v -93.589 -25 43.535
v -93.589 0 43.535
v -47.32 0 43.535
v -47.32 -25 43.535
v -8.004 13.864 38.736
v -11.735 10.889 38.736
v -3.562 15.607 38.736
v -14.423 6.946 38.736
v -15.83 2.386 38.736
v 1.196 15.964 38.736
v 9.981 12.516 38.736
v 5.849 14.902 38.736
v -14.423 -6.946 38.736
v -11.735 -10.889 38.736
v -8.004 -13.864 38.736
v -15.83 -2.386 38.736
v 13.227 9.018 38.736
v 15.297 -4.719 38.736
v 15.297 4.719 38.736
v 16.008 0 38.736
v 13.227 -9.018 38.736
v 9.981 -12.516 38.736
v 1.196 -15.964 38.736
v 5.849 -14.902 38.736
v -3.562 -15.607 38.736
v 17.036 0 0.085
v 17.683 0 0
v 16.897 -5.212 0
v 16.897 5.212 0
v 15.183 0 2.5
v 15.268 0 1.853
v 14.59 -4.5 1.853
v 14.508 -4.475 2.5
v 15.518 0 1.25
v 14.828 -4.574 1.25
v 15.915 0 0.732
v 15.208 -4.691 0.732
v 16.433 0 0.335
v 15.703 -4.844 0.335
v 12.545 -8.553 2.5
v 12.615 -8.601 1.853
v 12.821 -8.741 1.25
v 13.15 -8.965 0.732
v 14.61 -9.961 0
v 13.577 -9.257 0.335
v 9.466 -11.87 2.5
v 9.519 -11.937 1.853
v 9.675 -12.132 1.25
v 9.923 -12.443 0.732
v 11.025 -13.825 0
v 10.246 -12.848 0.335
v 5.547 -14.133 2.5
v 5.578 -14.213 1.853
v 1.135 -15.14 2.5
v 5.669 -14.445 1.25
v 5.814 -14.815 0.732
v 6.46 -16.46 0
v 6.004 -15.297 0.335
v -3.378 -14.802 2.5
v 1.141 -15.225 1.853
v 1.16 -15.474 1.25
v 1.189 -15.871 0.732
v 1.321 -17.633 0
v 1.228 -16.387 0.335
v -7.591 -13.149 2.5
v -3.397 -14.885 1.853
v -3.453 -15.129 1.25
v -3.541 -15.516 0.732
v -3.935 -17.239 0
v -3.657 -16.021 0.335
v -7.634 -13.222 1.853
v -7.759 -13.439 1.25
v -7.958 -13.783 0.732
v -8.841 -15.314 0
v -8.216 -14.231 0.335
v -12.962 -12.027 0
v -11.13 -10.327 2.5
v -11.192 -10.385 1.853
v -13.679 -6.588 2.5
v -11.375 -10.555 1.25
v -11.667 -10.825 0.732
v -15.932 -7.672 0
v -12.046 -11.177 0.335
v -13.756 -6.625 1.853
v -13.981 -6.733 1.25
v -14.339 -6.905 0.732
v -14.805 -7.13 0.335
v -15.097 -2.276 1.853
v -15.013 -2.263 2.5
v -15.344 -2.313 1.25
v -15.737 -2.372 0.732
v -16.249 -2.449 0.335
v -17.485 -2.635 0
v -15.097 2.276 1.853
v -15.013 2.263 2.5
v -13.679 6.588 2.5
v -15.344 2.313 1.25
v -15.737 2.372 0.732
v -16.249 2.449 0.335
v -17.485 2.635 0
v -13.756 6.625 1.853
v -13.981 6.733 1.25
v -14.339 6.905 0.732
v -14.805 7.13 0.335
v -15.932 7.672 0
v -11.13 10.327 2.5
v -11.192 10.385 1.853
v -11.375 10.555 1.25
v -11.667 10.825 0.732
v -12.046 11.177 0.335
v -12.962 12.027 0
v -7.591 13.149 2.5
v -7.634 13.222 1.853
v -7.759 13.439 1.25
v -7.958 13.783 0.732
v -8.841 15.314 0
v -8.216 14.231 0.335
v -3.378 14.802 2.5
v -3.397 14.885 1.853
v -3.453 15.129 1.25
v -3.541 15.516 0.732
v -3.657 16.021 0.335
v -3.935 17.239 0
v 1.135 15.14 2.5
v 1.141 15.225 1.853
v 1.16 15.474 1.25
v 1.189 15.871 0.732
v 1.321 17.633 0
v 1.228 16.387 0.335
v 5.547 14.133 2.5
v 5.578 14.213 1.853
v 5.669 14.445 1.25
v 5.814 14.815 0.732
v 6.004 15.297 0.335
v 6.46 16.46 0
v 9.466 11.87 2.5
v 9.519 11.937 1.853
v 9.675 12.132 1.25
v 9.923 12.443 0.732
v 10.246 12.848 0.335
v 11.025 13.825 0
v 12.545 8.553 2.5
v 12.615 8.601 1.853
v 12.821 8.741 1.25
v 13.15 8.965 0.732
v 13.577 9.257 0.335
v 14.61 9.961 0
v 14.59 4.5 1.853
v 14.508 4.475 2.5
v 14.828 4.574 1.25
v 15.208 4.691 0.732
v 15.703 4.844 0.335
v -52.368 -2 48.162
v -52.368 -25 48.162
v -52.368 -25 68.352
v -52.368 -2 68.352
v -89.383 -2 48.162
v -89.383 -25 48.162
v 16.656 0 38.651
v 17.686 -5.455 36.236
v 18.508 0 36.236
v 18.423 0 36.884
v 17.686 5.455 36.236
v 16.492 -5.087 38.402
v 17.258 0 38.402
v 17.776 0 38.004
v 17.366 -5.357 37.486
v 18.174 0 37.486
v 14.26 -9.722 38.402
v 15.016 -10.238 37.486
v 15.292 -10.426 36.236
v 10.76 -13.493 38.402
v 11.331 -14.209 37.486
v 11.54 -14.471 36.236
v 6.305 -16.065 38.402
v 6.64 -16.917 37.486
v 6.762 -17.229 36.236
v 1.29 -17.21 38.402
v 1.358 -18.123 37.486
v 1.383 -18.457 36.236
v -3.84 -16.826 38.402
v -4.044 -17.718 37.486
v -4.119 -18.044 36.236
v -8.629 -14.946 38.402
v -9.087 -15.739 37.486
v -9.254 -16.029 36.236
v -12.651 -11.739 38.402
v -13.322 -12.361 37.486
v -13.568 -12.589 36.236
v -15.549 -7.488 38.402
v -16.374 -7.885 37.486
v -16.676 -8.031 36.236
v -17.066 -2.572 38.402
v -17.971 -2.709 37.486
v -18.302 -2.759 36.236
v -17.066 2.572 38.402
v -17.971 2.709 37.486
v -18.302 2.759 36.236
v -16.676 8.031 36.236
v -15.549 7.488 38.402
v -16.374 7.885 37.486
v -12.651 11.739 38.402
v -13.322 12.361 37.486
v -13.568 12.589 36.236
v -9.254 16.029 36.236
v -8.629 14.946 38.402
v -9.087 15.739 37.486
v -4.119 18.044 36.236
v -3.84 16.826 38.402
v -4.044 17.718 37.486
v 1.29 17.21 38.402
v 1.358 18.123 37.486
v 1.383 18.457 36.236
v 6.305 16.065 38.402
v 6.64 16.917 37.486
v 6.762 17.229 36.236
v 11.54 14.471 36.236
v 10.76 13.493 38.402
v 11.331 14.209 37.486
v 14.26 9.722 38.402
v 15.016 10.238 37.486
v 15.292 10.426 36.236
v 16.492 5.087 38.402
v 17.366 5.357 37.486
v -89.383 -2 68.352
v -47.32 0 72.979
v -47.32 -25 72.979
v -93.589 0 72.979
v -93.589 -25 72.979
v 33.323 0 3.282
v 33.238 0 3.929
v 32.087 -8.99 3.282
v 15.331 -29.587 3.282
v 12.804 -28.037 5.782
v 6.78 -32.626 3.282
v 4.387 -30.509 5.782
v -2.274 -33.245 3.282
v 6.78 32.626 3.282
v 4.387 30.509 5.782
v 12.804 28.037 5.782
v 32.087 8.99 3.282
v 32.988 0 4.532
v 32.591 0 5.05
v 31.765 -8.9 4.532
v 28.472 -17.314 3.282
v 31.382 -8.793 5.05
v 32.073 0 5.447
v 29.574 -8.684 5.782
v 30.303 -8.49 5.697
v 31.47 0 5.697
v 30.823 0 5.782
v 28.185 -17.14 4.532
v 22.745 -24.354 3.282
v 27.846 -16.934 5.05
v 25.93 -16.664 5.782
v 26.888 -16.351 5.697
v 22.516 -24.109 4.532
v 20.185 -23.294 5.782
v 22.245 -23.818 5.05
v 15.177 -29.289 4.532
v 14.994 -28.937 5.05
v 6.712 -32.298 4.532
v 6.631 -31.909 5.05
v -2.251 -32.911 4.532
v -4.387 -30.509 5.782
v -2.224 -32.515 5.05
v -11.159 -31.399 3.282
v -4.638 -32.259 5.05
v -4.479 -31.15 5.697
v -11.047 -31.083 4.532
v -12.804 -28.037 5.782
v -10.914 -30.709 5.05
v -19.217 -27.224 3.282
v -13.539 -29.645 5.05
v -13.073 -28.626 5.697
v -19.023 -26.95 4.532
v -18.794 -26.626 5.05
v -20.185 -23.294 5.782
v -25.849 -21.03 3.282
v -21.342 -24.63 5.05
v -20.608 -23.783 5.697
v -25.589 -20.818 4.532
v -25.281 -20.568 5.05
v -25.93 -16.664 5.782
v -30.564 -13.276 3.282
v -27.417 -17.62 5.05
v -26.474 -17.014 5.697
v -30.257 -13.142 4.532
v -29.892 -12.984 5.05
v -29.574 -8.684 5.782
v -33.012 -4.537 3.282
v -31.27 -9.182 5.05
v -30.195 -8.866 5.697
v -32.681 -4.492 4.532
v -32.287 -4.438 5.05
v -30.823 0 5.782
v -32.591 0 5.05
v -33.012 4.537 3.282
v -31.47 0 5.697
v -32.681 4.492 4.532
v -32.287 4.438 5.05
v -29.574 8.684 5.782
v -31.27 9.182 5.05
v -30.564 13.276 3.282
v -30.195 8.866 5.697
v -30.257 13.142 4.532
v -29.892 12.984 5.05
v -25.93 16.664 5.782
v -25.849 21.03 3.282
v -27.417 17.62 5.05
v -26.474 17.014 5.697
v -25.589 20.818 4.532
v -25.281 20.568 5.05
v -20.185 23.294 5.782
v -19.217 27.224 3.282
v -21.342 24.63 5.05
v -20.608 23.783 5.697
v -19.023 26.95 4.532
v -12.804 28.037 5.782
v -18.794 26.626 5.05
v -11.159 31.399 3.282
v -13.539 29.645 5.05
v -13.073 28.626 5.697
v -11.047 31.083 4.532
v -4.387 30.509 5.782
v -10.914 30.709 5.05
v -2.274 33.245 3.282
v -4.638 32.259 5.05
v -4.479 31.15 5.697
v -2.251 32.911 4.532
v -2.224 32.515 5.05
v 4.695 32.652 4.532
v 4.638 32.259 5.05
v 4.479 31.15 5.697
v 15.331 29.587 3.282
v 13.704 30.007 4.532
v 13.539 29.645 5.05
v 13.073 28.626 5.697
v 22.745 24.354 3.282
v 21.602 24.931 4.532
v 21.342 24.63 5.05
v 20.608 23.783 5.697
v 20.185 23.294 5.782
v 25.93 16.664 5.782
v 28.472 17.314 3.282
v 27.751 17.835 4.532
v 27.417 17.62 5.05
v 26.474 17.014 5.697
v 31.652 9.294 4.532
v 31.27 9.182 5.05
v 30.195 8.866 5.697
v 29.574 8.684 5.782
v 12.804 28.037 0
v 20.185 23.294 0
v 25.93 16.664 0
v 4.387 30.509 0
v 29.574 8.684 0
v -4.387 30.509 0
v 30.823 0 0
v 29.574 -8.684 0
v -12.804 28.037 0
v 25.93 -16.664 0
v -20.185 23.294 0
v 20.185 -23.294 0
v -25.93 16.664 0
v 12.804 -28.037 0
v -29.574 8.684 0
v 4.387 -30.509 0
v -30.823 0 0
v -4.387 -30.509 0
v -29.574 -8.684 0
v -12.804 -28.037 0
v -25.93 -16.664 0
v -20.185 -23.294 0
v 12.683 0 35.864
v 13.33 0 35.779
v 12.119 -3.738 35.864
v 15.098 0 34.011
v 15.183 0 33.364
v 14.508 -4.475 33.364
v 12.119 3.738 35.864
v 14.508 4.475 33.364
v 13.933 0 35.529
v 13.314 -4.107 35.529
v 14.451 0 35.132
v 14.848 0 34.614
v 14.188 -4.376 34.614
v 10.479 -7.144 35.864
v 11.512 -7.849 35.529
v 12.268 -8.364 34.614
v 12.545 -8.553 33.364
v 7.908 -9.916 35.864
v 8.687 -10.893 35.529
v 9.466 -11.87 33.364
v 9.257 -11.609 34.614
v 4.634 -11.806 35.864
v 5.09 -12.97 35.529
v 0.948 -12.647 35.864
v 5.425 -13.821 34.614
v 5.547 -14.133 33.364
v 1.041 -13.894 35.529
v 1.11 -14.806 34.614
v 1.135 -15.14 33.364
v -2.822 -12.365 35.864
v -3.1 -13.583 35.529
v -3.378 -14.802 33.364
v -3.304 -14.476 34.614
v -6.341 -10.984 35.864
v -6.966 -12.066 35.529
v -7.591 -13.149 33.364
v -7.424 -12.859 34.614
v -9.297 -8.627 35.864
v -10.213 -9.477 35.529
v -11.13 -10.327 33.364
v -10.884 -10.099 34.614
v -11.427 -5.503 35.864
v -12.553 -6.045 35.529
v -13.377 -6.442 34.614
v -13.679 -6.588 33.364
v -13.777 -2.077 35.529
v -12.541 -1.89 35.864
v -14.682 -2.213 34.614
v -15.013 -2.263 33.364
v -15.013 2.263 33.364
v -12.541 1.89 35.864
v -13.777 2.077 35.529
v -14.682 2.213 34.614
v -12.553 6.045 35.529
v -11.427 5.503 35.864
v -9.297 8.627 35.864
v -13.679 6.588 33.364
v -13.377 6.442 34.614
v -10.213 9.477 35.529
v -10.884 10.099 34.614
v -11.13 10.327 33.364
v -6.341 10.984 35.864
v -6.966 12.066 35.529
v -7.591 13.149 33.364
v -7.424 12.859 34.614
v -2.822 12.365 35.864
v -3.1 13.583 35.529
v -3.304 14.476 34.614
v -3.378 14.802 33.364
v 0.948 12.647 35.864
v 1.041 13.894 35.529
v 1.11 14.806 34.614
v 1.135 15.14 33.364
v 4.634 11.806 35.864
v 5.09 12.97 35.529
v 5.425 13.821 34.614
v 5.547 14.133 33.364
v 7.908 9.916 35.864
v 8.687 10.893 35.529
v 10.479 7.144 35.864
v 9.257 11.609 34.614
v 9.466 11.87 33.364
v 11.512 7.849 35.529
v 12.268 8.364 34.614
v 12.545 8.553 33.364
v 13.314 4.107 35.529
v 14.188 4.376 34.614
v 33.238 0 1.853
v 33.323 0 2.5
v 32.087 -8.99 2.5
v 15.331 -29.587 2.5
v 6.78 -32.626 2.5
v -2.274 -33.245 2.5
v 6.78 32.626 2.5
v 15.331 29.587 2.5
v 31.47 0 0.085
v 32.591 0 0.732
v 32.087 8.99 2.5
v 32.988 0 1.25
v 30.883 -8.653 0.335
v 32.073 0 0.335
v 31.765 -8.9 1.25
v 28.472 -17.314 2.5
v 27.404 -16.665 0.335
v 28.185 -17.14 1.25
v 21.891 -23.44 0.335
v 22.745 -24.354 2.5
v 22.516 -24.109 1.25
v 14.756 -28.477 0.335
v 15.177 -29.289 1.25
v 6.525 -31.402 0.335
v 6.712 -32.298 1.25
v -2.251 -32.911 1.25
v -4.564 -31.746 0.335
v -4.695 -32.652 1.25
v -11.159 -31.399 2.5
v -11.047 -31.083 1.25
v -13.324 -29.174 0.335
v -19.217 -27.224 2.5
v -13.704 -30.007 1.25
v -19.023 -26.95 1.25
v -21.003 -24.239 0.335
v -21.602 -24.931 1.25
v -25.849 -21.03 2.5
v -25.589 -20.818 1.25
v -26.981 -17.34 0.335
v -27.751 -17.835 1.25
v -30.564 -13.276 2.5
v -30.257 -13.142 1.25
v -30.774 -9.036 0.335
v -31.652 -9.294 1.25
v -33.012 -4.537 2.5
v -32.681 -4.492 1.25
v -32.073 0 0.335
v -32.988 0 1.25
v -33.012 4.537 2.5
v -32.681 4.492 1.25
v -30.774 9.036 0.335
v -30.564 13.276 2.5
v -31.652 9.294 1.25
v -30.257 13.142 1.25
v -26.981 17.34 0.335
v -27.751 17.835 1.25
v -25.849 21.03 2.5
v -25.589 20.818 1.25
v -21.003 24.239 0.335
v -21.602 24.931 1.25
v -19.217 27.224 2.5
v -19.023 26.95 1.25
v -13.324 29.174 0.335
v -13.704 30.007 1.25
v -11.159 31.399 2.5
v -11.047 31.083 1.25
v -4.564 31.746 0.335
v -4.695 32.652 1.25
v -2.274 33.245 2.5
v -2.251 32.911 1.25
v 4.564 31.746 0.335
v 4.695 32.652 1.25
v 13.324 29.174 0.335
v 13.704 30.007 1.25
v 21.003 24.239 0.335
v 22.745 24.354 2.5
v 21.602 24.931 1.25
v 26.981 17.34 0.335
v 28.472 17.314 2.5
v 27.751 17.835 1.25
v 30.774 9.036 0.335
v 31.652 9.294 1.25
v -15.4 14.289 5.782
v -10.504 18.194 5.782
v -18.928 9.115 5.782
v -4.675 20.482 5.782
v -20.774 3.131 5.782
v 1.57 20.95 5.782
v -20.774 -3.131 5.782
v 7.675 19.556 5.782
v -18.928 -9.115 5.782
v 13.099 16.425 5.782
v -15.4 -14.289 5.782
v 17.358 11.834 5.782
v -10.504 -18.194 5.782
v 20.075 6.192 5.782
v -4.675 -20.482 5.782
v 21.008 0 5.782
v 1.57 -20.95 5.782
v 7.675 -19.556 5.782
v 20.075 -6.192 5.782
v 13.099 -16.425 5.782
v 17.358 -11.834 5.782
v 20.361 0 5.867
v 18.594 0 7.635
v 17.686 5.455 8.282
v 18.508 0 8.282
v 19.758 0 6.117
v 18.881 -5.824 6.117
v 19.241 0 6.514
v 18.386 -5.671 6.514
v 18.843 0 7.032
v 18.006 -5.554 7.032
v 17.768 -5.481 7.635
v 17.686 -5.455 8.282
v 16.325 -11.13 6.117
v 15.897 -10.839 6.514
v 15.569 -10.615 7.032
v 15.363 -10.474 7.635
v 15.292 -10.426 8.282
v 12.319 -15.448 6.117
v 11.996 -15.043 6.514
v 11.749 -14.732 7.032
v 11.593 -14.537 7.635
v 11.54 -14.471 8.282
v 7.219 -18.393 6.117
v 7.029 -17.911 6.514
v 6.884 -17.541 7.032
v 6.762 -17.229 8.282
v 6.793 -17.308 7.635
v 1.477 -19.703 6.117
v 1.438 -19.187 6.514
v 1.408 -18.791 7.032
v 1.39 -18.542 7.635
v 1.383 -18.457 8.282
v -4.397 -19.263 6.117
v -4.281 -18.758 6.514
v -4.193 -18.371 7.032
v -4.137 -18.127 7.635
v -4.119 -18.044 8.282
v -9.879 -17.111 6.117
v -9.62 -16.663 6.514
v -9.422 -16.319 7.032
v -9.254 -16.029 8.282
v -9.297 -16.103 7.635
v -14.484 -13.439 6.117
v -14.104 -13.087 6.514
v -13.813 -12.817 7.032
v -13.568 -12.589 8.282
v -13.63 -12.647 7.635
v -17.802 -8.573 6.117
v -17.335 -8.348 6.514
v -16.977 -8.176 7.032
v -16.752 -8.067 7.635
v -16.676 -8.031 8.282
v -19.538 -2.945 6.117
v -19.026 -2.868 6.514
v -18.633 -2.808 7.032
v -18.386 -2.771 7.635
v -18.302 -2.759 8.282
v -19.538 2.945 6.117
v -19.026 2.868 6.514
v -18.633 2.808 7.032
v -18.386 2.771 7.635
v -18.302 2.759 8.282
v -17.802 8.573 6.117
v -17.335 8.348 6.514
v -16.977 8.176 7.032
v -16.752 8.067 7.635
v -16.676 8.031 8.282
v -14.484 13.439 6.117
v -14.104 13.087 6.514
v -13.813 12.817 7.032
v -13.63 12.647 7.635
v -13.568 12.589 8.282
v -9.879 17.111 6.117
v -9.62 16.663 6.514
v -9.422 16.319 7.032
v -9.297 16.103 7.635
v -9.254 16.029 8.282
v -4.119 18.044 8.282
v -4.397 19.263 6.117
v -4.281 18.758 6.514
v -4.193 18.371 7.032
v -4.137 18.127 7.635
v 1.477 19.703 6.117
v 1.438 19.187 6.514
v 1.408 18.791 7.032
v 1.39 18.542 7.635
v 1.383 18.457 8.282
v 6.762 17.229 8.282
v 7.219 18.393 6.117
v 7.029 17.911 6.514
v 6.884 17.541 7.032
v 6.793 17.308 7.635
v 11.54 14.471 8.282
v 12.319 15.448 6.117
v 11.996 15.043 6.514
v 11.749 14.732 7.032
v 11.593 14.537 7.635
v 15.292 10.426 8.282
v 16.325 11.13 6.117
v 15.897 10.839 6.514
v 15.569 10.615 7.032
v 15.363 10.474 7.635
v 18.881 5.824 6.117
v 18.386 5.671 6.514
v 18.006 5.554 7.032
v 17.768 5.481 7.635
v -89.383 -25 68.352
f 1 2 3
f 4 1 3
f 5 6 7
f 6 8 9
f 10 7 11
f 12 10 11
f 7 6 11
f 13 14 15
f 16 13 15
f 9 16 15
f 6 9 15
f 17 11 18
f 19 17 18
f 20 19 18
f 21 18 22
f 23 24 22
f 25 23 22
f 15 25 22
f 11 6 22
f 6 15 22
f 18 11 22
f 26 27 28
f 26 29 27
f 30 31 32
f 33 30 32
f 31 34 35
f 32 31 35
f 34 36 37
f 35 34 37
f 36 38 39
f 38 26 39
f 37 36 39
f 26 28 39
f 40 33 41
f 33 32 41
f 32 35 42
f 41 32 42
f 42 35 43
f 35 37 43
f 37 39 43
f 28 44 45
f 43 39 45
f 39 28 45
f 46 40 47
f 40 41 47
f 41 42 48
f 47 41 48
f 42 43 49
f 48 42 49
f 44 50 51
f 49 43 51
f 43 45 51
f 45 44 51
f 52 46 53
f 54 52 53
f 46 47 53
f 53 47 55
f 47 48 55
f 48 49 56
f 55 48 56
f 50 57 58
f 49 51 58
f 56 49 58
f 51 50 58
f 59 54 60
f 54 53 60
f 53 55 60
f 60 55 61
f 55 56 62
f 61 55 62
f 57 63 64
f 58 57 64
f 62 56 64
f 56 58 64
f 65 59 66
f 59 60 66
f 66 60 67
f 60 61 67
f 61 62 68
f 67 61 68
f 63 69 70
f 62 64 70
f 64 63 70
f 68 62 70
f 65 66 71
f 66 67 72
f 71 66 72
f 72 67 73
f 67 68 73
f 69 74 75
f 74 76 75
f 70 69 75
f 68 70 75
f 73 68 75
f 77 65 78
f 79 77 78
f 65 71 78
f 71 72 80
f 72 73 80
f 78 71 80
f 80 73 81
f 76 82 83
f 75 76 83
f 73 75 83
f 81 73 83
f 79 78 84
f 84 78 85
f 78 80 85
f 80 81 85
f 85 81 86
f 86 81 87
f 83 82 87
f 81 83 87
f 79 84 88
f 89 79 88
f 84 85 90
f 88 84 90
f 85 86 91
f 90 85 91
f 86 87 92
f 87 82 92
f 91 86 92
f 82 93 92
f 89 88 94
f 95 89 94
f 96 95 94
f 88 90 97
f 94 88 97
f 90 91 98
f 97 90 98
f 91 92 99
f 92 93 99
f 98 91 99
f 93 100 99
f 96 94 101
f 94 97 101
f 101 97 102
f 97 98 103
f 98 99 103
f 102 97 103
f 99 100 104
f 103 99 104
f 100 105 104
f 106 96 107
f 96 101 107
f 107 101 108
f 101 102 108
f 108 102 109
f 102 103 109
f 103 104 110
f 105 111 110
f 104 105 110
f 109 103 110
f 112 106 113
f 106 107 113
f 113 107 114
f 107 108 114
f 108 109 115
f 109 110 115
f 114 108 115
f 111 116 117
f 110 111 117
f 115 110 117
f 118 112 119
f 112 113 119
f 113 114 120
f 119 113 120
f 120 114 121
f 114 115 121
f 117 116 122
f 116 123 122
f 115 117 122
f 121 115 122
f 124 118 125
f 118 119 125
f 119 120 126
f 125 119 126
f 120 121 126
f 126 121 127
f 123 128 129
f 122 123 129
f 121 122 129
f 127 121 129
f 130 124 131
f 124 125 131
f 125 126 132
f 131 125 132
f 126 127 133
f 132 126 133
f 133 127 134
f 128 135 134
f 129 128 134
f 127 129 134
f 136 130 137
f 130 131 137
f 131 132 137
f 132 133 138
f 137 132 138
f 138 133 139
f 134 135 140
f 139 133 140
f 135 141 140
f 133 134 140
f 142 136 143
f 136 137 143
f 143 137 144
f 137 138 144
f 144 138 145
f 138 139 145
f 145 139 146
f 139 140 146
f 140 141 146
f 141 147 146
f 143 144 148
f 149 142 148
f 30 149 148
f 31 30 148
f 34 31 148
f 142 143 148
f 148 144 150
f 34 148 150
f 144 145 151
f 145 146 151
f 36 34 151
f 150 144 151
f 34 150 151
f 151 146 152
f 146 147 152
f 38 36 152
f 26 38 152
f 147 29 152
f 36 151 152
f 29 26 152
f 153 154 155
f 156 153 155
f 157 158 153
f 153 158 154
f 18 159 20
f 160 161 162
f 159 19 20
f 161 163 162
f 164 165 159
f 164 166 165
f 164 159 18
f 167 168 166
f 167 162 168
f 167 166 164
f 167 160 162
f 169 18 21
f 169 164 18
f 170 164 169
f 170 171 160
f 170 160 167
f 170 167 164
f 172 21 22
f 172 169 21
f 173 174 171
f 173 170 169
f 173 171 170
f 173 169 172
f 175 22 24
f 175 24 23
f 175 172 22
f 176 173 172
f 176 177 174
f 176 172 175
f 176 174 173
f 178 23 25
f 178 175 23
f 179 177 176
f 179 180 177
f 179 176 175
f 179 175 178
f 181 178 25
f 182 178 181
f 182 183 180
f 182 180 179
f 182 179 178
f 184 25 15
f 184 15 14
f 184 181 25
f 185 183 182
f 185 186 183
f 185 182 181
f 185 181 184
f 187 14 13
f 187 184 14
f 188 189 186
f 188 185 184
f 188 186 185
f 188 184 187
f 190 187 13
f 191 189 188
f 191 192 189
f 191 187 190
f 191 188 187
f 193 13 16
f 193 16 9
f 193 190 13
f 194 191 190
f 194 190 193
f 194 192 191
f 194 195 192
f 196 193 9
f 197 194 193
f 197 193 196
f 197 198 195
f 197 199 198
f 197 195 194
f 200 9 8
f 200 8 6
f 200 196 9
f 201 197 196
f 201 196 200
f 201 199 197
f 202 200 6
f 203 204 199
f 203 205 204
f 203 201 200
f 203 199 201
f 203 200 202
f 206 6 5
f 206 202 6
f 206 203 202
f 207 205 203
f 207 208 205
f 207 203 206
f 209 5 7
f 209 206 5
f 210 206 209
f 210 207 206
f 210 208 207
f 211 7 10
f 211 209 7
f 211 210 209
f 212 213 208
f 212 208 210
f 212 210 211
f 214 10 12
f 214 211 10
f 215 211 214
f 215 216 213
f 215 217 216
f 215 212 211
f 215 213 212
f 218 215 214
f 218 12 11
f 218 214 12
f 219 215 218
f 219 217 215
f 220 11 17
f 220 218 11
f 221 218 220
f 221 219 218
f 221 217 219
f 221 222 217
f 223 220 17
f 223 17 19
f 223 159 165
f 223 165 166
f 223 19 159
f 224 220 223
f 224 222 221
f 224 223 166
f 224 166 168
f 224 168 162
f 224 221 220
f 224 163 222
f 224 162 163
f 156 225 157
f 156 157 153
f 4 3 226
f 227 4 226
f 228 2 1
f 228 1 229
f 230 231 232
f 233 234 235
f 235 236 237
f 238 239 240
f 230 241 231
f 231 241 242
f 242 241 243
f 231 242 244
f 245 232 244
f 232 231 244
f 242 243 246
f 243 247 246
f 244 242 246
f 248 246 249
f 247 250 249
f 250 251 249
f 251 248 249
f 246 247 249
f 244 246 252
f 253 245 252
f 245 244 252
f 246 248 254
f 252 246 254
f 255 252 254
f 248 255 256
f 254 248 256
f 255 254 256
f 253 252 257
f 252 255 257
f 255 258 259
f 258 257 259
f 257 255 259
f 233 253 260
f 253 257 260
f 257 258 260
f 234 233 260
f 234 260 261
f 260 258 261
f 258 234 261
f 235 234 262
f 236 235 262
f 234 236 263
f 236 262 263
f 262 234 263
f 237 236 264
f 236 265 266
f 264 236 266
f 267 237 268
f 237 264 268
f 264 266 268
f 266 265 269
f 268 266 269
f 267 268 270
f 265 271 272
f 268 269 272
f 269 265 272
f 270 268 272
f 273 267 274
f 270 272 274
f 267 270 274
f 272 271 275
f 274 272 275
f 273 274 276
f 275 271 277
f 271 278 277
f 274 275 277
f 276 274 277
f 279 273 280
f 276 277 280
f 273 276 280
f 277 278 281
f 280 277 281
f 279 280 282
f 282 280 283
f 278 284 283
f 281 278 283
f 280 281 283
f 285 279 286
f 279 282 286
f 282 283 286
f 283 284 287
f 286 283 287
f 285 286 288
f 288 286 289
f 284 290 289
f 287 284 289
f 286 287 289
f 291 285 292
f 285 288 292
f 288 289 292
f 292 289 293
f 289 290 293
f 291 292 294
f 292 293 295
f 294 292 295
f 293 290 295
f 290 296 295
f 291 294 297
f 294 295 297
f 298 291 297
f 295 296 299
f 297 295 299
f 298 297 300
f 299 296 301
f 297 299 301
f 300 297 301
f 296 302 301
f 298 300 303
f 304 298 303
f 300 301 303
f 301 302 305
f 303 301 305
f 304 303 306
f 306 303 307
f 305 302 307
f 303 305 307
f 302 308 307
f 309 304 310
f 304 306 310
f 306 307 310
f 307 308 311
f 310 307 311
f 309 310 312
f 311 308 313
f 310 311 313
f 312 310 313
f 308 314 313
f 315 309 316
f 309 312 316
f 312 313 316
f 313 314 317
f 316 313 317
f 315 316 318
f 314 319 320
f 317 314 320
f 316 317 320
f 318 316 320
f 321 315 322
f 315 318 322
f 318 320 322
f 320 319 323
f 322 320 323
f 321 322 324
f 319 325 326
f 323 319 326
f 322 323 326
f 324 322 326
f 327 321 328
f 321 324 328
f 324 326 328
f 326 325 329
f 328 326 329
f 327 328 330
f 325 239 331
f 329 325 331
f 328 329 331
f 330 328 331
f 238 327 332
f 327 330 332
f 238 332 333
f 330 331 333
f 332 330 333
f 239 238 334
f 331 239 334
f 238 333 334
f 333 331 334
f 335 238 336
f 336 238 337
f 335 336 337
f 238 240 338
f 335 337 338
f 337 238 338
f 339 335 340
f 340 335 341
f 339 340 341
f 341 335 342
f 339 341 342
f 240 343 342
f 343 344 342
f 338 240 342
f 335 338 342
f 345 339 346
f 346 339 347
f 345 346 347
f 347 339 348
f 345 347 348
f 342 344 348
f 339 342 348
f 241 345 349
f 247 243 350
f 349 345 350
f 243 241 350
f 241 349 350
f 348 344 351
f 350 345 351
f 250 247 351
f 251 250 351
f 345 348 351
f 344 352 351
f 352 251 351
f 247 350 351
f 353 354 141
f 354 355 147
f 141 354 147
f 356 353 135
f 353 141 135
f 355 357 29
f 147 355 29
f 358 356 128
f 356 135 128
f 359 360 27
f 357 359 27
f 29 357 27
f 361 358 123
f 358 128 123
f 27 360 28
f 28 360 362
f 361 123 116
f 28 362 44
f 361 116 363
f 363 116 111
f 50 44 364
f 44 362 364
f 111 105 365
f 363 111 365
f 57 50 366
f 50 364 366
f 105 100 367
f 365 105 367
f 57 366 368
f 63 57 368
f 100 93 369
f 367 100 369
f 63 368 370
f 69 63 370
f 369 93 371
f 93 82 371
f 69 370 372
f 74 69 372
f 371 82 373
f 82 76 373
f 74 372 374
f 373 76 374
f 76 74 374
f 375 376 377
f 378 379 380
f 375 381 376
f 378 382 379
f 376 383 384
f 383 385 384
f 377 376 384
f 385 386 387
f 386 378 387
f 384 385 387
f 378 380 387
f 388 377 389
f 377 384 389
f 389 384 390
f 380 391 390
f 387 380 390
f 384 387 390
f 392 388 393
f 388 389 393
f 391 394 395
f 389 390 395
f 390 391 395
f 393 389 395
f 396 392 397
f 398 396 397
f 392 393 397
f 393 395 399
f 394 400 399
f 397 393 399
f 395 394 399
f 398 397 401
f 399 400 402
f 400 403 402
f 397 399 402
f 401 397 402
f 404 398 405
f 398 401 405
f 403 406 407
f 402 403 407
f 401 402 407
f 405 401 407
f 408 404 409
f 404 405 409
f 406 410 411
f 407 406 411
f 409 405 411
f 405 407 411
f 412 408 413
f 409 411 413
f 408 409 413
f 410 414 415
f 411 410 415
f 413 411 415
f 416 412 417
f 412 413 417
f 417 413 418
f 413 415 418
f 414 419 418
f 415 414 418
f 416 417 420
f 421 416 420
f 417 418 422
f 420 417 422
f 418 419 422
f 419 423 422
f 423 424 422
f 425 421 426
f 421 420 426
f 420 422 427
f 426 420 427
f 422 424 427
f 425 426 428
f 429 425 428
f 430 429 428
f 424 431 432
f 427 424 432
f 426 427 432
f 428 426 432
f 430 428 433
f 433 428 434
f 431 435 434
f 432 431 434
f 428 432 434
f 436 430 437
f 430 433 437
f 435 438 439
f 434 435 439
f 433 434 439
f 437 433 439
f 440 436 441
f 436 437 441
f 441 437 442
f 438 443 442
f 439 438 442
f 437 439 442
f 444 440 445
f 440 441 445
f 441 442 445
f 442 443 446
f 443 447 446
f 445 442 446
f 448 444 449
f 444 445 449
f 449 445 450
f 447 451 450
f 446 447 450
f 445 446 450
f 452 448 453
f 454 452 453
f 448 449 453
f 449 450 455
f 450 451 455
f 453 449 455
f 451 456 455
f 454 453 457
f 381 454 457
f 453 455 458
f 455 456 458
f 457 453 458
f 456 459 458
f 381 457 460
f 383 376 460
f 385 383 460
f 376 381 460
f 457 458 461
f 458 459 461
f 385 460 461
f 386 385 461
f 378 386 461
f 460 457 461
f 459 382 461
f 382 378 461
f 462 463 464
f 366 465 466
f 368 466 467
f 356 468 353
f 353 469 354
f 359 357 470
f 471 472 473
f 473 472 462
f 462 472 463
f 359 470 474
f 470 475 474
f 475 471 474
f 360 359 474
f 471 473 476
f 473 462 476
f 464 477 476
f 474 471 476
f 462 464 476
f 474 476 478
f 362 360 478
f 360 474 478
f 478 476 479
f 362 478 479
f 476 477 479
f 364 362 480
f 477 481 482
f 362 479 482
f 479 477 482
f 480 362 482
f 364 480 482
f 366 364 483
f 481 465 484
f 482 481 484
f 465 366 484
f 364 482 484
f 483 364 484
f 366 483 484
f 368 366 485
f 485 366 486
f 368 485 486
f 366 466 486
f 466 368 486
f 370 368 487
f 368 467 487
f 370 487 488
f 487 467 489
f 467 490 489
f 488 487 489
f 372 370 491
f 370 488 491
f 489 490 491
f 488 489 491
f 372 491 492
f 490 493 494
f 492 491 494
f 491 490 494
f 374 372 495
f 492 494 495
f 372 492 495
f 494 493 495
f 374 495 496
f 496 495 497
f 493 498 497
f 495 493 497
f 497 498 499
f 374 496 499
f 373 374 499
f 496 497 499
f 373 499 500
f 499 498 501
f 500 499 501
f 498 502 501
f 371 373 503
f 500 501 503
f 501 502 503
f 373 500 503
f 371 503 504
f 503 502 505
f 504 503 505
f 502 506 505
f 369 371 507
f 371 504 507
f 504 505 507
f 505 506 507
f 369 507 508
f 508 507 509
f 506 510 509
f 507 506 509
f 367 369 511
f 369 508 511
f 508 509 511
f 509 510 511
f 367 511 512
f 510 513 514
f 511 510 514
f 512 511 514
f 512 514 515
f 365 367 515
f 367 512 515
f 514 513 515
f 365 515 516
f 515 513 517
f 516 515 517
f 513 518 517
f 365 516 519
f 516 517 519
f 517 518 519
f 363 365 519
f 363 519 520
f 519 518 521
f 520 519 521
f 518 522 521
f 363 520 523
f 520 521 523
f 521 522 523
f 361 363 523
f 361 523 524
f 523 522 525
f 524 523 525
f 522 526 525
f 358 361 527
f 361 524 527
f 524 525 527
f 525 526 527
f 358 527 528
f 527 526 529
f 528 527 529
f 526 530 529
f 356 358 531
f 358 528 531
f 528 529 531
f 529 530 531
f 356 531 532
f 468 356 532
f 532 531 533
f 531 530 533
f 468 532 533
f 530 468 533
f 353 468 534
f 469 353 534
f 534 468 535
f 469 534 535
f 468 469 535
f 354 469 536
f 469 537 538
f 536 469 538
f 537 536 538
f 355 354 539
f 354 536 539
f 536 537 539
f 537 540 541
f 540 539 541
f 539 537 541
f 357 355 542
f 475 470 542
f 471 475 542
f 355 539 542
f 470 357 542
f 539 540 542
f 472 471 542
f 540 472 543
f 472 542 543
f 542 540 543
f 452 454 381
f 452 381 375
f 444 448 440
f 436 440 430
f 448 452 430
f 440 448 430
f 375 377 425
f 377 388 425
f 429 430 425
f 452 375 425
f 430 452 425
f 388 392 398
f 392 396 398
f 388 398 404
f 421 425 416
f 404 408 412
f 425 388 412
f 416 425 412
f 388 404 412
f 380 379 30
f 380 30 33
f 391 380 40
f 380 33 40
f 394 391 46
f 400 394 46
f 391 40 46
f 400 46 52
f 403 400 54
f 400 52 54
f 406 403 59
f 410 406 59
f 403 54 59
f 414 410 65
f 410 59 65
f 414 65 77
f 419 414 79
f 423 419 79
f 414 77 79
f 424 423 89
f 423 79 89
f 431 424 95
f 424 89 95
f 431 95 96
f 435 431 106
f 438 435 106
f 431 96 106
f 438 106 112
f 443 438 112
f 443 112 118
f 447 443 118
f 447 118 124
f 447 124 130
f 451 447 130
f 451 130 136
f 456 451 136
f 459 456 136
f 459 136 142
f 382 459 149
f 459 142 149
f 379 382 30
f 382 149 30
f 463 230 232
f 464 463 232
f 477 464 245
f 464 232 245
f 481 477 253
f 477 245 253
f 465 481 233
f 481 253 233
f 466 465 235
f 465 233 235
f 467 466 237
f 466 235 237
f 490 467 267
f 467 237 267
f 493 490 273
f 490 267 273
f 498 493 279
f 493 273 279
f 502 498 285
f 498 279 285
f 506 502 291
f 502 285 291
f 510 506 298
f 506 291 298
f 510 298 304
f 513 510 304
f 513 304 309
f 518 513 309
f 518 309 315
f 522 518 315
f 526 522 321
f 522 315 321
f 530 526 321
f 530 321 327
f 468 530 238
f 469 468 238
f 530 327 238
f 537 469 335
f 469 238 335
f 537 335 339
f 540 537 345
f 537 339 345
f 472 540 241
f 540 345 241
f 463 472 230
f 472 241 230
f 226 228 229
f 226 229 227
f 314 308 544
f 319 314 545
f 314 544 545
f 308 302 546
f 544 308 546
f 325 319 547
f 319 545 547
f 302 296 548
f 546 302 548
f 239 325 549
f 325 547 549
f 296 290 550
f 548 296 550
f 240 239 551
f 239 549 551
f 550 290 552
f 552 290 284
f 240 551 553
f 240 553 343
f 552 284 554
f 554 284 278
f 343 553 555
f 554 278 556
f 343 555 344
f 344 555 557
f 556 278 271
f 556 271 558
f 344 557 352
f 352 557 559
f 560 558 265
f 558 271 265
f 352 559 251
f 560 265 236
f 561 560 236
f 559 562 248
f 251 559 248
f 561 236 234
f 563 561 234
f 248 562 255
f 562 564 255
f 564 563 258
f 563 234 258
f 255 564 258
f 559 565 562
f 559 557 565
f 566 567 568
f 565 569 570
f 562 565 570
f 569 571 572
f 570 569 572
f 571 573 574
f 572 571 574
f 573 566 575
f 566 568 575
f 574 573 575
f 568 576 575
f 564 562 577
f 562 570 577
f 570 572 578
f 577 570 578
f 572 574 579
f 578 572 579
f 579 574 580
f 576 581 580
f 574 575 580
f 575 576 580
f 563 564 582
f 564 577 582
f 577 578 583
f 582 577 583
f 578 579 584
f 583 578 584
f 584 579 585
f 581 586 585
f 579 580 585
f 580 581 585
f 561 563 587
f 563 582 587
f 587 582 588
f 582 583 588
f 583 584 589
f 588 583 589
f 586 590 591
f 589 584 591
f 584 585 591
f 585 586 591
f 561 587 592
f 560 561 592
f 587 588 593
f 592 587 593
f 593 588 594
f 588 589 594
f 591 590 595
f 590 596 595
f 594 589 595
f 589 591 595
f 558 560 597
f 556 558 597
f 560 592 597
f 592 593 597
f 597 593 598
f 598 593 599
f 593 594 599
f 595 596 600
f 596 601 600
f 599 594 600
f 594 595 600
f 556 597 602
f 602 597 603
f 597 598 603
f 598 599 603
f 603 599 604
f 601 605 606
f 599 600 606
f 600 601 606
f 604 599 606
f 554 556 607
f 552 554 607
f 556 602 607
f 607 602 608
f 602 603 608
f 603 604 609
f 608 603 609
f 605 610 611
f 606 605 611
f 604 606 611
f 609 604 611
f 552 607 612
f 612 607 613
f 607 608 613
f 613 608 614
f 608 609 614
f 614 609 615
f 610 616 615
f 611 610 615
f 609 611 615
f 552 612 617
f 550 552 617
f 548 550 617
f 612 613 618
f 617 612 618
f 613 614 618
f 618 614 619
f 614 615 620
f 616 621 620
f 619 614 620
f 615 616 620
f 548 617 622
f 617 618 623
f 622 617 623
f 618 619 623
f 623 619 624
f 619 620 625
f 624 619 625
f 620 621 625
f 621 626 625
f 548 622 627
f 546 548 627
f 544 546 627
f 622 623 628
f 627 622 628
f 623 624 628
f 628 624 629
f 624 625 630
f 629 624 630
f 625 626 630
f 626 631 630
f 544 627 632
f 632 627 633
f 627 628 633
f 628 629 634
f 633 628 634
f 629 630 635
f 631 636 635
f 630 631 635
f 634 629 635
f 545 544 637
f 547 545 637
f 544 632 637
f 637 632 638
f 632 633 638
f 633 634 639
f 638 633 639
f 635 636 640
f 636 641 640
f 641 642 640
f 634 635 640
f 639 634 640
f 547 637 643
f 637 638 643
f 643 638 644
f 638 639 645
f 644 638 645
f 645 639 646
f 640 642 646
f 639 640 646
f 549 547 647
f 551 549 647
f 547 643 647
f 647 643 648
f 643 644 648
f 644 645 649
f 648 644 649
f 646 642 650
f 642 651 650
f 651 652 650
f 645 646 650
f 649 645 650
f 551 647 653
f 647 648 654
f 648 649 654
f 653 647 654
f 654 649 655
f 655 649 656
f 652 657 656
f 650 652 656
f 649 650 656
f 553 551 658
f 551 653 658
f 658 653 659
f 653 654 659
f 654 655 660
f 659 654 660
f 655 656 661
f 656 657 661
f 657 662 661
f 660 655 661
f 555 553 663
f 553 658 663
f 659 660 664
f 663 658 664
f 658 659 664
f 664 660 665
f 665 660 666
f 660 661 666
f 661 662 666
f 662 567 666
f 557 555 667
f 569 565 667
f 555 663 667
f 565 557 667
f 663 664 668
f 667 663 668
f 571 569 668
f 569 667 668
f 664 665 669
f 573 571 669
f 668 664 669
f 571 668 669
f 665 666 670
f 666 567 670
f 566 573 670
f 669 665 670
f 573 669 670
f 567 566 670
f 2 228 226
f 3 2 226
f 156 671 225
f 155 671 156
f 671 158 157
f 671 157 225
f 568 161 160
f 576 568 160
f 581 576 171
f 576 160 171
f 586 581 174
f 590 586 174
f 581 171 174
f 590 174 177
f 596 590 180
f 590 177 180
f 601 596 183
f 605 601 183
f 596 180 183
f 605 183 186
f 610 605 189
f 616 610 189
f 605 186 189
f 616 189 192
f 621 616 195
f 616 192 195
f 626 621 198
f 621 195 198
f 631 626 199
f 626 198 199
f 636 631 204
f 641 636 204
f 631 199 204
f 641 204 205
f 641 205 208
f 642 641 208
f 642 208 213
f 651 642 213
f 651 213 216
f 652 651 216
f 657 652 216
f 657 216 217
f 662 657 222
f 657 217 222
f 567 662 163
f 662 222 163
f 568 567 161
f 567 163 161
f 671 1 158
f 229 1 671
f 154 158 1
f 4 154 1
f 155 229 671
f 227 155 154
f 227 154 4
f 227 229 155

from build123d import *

# Parameters (mm, degrees)
F2_R     = 2.5
F3_W     = 46.268799
F3_H     = 29.443782
F4_DEPTH = 25
F5_W     = 37.015043
F5_H     = 20.190026
F6_DEPTH = 23


with BuildPart() as f1:
    # F0 (on Front) → F1 (revolve)
    with BuildSketch(Plane.XZ):
        Polygon((18.508477, 38.736455), (0, 38.736455), (0, 35.864286), (15.182808, 35.864286), (15.182808, 0), (33.322807, 0), (33.322807, 5.782126), (18.508477, 5.782126), align=None)
    revolve(axis=Axis((0, 0, 37.300371), (0, 0, -1)))

    # F2
    f2_edges = [f1.edges().sort_by_distance(p)[0] for p in [
        (-15.182808, 0, 35.864286),
        (-15.182808, 0, 0),
        (-33.322807, 0, 5.782126),
        (-33.322807, 0, 0),
        (-18.508477, 0, 5.782126),
        (-18.508477, 0, 38.736455),
    ]]
    fillet(f2_edges, radius=F2_R)


with BuildPart() as f4:
    # F3 (on Front) → F4 (new body)
    with BuildSketch(Plane.XZ):
        with Locations((-70.454757, 58.256628)):
            Rectangle(F3_W, F3_H)
    extrude(amount=F4_DEPTH)

    # F5 (on face) → F6 (cut)
    with BuildSketch(Plane.XZ.offset(25)):
        with Locations((-70.875388, 58.256628)):
            Rectangle(F5_W, F5_H)
    extrude(amount=-F6_DEPTH, mode=Mode.SUBTRACT)


solid = Compound([f1.part, f4.part])
